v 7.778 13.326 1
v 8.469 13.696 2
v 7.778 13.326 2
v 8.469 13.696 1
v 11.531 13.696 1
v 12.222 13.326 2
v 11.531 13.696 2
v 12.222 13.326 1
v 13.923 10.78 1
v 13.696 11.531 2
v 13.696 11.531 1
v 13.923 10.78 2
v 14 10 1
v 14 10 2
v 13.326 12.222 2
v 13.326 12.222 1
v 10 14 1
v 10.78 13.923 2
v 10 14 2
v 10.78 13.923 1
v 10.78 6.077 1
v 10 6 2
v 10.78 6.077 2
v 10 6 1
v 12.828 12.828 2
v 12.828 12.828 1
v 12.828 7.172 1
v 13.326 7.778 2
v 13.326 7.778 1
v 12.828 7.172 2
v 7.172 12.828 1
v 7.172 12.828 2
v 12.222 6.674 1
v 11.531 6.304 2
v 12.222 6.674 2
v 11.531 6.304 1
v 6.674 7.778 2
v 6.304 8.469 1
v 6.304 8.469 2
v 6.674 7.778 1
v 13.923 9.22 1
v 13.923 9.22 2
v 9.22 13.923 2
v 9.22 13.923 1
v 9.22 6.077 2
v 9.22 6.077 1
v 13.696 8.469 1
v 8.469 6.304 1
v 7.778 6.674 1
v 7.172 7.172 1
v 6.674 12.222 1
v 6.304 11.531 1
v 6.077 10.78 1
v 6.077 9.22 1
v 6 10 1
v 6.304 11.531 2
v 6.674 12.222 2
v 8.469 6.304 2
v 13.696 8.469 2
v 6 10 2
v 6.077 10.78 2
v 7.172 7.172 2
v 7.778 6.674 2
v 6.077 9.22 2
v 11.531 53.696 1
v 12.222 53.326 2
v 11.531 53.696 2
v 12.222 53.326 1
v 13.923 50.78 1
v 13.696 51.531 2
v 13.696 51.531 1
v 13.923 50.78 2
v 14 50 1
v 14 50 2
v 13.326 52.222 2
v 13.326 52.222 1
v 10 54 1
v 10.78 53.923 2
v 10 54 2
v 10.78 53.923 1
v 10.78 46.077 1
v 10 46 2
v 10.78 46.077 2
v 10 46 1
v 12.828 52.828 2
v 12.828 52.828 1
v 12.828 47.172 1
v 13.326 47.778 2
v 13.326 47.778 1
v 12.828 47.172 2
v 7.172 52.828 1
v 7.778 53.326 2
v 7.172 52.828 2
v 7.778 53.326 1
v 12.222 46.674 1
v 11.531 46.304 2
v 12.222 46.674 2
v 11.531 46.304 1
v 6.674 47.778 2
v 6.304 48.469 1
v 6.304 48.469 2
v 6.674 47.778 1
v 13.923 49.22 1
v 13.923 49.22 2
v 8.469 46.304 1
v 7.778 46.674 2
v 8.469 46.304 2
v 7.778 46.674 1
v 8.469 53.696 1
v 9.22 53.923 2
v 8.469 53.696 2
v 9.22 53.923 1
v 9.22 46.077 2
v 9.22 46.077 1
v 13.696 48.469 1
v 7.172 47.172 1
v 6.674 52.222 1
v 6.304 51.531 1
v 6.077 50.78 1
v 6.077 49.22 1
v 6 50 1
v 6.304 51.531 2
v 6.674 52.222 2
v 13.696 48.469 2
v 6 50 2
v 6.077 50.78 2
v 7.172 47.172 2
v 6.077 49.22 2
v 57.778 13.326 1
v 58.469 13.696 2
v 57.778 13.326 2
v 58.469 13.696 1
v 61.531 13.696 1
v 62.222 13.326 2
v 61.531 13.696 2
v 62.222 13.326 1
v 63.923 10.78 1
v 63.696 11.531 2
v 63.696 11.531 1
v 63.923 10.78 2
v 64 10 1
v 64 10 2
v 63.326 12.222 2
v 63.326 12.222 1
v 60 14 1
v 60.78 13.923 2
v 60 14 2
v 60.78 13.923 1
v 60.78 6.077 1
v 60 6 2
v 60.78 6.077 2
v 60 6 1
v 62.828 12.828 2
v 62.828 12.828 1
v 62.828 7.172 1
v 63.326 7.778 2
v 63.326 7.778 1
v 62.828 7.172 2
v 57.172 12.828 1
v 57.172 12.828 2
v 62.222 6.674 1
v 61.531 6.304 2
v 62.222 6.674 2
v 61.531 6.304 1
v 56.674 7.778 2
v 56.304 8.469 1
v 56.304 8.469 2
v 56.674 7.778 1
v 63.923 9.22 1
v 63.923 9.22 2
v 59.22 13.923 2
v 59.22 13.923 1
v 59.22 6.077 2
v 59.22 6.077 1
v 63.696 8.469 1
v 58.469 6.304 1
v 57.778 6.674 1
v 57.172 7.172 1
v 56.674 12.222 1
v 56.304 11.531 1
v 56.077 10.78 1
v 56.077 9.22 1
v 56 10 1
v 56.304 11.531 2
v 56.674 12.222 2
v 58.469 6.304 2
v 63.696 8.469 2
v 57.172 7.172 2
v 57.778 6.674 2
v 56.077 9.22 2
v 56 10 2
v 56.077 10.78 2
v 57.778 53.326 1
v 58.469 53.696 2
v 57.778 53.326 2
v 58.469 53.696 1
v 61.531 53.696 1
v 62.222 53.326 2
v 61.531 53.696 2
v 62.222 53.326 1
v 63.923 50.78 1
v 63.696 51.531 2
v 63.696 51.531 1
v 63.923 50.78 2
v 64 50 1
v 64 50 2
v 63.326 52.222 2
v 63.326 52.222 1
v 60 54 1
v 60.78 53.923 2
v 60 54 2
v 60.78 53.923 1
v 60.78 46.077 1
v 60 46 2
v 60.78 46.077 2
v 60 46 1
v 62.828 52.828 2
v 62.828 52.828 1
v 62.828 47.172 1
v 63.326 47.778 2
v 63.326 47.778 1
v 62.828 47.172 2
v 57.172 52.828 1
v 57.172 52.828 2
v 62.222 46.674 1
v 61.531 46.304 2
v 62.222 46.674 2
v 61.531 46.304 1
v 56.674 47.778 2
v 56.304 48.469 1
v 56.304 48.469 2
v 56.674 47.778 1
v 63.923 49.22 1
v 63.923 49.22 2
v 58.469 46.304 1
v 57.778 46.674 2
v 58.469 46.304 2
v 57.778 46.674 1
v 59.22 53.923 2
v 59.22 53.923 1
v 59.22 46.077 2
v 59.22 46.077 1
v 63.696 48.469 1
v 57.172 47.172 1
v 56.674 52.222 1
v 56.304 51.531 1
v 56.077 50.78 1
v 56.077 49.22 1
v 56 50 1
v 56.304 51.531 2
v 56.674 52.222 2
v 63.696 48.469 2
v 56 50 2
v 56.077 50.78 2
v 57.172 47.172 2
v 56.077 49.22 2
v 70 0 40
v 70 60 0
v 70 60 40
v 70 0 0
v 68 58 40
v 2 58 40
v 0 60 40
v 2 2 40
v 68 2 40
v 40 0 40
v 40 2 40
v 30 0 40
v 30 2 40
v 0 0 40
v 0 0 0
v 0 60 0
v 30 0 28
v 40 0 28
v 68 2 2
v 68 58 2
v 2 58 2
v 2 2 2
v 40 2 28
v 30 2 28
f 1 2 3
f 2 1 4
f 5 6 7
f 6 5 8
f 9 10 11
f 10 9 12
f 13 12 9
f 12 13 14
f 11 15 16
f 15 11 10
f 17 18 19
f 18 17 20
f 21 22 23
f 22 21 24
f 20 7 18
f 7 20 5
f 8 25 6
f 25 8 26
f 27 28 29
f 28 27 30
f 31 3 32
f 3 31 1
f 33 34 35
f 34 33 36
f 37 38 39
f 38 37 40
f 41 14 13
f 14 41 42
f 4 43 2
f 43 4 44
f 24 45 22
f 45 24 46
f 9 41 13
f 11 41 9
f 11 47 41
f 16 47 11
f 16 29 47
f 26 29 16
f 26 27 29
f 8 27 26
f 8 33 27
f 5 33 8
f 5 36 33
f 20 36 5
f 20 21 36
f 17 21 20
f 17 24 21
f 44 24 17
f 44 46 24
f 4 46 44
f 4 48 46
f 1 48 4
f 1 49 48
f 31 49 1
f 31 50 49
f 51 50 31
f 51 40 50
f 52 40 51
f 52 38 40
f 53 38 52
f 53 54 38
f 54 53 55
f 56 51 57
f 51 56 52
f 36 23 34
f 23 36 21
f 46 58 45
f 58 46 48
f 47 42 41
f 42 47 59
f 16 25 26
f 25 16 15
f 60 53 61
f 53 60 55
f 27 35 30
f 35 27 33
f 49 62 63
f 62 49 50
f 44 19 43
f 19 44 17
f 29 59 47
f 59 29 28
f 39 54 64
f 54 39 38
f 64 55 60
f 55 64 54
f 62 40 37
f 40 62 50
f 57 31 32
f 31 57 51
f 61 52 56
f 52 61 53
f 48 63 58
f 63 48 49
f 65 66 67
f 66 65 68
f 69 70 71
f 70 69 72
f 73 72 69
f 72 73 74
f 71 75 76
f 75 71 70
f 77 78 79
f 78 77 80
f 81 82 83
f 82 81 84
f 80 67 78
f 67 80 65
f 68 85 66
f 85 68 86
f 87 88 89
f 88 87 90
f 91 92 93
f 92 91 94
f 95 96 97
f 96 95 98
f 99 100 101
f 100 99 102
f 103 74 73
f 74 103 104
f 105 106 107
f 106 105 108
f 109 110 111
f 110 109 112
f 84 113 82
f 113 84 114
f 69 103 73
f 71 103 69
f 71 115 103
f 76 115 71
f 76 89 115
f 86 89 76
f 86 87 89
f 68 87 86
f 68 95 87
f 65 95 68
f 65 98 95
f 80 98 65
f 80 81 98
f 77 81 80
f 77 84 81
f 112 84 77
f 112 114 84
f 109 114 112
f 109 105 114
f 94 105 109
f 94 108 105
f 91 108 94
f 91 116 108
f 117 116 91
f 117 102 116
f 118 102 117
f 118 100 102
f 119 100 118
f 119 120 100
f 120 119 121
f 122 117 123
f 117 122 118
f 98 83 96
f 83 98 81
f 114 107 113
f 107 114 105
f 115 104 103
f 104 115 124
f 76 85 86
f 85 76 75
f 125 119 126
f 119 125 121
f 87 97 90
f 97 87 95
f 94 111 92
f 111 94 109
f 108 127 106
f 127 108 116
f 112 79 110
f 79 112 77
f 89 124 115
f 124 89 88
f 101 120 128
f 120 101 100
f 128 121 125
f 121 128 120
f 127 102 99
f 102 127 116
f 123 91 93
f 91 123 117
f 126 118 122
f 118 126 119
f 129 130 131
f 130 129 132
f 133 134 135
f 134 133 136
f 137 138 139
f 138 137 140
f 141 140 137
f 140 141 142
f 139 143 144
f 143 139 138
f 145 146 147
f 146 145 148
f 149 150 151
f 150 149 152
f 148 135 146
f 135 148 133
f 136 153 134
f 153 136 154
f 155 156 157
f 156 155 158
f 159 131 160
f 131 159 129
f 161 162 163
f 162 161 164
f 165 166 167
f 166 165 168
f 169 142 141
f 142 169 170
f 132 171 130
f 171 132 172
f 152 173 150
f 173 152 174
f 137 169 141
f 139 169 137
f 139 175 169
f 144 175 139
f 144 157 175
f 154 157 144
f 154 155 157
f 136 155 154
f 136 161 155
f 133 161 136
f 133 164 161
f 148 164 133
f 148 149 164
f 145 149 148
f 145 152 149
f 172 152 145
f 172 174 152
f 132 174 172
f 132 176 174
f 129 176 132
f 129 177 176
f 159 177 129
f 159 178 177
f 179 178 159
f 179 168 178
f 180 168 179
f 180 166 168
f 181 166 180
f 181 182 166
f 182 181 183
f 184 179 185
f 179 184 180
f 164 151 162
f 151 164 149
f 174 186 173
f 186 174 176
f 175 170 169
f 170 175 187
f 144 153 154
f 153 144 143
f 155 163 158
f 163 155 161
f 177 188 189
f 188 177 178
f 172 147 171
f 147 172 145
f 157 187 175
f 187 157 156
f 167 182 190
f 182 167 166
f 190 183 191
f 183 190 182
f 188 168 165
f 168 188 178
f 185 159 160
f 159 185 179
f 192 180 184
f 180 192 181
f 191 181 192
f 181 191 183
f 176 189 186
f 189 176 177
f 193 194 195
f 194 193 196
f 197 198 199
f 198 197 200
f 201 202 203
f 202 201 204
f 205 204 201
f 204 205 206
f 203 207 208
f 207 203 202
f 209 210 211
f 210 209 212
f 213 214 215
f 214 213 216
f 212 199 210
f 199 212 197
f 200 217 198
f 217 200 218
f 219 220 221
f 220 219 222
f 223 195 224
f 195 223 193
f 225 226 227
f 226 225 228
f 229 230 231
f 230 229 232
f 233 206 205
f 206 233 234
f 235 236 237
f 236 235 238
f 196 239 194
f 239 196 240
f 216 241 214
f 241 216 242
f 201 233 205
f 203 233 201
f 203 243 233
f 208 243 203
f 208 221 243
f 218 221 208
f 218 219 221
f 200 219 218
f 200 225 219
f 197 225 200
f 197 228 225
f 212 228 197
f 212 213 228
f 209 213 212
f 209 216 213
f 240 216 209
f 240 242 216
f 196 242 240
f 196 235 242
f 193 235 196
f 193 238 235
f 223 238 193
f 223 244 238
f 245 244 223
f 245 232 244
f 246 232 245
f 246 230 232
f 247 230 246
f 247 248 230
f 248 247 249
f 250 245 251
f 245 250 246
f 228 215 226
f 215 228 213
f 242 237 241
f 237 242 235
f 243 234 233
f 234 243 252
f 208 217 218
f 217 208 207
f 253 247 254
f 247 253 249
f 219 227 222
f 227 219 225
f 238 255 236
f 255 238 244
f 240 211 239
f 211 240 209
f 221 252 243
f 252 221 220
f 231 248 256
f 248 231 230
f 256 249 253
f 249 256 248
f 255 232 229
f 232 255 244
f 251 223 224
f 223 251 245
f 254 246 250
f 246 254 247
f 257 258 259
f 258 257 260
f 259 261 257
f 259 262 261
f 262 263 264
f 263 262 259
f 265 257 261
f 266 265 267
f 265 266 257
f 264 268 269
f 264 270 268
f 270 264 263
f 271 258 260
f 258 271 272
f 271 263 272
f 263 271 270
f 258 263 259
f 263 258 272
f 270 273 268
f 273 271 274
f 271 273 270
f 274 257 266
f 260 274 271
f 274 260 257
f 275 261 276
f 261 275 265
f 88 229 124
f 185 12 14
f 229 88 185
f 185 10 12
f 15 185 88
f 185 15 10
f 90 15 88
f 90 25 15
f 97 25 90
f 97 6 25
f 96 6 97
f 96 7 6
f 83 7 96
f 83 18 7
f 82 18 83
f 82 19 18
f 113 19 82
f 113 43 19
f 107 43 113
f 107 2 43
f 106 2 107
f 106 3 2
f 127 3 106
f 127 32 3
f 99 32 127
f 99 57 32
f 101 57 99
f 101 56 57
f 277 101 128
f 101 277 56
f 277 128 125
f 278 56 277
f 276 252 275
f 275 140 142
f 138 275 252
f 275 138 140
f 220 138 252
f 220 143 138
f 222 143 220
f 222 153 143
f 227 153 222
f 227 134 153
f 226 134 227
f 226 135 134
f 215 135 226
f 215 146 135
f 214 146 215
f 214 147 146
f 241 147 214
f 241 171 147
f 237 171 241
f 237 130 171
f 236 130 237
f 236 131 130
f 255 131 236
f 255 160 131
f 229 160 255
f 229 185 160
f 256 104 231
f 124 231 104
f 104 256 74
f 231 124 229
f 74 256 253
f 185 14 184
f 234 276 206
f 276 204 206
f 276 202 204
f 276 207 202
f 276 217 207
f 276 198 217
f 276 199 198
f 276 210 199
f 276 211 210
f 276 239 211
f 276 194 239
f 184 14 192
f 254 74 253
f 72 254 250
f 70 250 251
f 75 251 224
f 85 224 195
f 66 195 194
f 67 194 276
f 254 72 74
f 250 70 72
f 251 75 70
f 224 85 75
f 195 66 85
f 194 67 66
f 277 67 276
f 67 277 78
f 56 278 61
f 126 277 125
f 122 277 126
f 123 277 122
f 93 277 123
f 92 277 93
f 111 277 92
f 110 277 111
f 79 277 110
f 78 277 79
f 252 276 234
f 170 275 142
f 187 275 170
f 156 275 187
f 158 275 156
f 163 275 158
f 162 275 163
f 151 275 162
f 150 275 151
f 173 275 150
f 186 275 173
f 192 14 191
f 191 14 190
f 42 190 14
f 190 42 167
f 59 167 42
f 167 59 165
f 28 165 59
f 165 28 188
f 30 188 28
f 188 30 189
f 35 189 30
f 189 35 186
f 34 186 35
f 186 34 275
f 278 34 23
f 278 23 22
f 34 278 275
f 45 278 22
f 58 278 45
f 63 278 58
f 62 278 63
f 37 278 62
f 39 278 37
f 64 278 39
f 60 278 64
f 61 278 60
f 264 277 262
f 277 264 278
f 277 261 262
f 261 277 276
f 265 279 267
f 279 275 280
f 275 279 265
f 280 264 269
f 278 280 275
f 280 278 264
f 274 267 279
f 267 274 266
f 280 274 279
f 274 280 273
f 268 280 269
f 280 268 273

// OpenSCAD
$fn = 32;

// ----------------------------------------------------------------------
// Enclosure box: both enclosure
// ----------------------------------------------------------------------

// --- parameters (mm) ---
box_l = 70;               // outer length, X
box_w = 60;               // outer width, Y
box_h = 40;               // outer height
wall_t = 2;               // wall thickness
boss_r = 4;               // corner boss radius
hole_r = 2;               // boss screw hole radius
boss_in = 10;             // boss inset from the corners
notch_w = 10;             // cable notch width
notch_h = 12;             // cable notch height

inner_h = box_h - wall_t;  // cavity depth
boss_h = inner_h - 2;  // corner boss height

difference() {
  cube([box_l, box_w, box_h]);
  translate([wall_t, wall_t, wall_t])
    cube([box_l - 2 * wall_t, box_w - 2 * wall_t, box_h]);
  for (sx = [0, 1], sy = [0, 1])
    translate([sx ? box_l - boss_in : boss_in,
               sy ? box_w - boss_in : boss_in, wall_t - 1]) {
      cylinder(r = boss_r, h = boss_h);
      translate([0, 0, boss_h - 4])
        cylinder(r = hole_r, h = 5);
    }
  translate([box_l / 2 - notch_w / 2, -1, box_h - notch_h])
    cube([notch_w, wall_t + 2, notch_h + 1]);
}
